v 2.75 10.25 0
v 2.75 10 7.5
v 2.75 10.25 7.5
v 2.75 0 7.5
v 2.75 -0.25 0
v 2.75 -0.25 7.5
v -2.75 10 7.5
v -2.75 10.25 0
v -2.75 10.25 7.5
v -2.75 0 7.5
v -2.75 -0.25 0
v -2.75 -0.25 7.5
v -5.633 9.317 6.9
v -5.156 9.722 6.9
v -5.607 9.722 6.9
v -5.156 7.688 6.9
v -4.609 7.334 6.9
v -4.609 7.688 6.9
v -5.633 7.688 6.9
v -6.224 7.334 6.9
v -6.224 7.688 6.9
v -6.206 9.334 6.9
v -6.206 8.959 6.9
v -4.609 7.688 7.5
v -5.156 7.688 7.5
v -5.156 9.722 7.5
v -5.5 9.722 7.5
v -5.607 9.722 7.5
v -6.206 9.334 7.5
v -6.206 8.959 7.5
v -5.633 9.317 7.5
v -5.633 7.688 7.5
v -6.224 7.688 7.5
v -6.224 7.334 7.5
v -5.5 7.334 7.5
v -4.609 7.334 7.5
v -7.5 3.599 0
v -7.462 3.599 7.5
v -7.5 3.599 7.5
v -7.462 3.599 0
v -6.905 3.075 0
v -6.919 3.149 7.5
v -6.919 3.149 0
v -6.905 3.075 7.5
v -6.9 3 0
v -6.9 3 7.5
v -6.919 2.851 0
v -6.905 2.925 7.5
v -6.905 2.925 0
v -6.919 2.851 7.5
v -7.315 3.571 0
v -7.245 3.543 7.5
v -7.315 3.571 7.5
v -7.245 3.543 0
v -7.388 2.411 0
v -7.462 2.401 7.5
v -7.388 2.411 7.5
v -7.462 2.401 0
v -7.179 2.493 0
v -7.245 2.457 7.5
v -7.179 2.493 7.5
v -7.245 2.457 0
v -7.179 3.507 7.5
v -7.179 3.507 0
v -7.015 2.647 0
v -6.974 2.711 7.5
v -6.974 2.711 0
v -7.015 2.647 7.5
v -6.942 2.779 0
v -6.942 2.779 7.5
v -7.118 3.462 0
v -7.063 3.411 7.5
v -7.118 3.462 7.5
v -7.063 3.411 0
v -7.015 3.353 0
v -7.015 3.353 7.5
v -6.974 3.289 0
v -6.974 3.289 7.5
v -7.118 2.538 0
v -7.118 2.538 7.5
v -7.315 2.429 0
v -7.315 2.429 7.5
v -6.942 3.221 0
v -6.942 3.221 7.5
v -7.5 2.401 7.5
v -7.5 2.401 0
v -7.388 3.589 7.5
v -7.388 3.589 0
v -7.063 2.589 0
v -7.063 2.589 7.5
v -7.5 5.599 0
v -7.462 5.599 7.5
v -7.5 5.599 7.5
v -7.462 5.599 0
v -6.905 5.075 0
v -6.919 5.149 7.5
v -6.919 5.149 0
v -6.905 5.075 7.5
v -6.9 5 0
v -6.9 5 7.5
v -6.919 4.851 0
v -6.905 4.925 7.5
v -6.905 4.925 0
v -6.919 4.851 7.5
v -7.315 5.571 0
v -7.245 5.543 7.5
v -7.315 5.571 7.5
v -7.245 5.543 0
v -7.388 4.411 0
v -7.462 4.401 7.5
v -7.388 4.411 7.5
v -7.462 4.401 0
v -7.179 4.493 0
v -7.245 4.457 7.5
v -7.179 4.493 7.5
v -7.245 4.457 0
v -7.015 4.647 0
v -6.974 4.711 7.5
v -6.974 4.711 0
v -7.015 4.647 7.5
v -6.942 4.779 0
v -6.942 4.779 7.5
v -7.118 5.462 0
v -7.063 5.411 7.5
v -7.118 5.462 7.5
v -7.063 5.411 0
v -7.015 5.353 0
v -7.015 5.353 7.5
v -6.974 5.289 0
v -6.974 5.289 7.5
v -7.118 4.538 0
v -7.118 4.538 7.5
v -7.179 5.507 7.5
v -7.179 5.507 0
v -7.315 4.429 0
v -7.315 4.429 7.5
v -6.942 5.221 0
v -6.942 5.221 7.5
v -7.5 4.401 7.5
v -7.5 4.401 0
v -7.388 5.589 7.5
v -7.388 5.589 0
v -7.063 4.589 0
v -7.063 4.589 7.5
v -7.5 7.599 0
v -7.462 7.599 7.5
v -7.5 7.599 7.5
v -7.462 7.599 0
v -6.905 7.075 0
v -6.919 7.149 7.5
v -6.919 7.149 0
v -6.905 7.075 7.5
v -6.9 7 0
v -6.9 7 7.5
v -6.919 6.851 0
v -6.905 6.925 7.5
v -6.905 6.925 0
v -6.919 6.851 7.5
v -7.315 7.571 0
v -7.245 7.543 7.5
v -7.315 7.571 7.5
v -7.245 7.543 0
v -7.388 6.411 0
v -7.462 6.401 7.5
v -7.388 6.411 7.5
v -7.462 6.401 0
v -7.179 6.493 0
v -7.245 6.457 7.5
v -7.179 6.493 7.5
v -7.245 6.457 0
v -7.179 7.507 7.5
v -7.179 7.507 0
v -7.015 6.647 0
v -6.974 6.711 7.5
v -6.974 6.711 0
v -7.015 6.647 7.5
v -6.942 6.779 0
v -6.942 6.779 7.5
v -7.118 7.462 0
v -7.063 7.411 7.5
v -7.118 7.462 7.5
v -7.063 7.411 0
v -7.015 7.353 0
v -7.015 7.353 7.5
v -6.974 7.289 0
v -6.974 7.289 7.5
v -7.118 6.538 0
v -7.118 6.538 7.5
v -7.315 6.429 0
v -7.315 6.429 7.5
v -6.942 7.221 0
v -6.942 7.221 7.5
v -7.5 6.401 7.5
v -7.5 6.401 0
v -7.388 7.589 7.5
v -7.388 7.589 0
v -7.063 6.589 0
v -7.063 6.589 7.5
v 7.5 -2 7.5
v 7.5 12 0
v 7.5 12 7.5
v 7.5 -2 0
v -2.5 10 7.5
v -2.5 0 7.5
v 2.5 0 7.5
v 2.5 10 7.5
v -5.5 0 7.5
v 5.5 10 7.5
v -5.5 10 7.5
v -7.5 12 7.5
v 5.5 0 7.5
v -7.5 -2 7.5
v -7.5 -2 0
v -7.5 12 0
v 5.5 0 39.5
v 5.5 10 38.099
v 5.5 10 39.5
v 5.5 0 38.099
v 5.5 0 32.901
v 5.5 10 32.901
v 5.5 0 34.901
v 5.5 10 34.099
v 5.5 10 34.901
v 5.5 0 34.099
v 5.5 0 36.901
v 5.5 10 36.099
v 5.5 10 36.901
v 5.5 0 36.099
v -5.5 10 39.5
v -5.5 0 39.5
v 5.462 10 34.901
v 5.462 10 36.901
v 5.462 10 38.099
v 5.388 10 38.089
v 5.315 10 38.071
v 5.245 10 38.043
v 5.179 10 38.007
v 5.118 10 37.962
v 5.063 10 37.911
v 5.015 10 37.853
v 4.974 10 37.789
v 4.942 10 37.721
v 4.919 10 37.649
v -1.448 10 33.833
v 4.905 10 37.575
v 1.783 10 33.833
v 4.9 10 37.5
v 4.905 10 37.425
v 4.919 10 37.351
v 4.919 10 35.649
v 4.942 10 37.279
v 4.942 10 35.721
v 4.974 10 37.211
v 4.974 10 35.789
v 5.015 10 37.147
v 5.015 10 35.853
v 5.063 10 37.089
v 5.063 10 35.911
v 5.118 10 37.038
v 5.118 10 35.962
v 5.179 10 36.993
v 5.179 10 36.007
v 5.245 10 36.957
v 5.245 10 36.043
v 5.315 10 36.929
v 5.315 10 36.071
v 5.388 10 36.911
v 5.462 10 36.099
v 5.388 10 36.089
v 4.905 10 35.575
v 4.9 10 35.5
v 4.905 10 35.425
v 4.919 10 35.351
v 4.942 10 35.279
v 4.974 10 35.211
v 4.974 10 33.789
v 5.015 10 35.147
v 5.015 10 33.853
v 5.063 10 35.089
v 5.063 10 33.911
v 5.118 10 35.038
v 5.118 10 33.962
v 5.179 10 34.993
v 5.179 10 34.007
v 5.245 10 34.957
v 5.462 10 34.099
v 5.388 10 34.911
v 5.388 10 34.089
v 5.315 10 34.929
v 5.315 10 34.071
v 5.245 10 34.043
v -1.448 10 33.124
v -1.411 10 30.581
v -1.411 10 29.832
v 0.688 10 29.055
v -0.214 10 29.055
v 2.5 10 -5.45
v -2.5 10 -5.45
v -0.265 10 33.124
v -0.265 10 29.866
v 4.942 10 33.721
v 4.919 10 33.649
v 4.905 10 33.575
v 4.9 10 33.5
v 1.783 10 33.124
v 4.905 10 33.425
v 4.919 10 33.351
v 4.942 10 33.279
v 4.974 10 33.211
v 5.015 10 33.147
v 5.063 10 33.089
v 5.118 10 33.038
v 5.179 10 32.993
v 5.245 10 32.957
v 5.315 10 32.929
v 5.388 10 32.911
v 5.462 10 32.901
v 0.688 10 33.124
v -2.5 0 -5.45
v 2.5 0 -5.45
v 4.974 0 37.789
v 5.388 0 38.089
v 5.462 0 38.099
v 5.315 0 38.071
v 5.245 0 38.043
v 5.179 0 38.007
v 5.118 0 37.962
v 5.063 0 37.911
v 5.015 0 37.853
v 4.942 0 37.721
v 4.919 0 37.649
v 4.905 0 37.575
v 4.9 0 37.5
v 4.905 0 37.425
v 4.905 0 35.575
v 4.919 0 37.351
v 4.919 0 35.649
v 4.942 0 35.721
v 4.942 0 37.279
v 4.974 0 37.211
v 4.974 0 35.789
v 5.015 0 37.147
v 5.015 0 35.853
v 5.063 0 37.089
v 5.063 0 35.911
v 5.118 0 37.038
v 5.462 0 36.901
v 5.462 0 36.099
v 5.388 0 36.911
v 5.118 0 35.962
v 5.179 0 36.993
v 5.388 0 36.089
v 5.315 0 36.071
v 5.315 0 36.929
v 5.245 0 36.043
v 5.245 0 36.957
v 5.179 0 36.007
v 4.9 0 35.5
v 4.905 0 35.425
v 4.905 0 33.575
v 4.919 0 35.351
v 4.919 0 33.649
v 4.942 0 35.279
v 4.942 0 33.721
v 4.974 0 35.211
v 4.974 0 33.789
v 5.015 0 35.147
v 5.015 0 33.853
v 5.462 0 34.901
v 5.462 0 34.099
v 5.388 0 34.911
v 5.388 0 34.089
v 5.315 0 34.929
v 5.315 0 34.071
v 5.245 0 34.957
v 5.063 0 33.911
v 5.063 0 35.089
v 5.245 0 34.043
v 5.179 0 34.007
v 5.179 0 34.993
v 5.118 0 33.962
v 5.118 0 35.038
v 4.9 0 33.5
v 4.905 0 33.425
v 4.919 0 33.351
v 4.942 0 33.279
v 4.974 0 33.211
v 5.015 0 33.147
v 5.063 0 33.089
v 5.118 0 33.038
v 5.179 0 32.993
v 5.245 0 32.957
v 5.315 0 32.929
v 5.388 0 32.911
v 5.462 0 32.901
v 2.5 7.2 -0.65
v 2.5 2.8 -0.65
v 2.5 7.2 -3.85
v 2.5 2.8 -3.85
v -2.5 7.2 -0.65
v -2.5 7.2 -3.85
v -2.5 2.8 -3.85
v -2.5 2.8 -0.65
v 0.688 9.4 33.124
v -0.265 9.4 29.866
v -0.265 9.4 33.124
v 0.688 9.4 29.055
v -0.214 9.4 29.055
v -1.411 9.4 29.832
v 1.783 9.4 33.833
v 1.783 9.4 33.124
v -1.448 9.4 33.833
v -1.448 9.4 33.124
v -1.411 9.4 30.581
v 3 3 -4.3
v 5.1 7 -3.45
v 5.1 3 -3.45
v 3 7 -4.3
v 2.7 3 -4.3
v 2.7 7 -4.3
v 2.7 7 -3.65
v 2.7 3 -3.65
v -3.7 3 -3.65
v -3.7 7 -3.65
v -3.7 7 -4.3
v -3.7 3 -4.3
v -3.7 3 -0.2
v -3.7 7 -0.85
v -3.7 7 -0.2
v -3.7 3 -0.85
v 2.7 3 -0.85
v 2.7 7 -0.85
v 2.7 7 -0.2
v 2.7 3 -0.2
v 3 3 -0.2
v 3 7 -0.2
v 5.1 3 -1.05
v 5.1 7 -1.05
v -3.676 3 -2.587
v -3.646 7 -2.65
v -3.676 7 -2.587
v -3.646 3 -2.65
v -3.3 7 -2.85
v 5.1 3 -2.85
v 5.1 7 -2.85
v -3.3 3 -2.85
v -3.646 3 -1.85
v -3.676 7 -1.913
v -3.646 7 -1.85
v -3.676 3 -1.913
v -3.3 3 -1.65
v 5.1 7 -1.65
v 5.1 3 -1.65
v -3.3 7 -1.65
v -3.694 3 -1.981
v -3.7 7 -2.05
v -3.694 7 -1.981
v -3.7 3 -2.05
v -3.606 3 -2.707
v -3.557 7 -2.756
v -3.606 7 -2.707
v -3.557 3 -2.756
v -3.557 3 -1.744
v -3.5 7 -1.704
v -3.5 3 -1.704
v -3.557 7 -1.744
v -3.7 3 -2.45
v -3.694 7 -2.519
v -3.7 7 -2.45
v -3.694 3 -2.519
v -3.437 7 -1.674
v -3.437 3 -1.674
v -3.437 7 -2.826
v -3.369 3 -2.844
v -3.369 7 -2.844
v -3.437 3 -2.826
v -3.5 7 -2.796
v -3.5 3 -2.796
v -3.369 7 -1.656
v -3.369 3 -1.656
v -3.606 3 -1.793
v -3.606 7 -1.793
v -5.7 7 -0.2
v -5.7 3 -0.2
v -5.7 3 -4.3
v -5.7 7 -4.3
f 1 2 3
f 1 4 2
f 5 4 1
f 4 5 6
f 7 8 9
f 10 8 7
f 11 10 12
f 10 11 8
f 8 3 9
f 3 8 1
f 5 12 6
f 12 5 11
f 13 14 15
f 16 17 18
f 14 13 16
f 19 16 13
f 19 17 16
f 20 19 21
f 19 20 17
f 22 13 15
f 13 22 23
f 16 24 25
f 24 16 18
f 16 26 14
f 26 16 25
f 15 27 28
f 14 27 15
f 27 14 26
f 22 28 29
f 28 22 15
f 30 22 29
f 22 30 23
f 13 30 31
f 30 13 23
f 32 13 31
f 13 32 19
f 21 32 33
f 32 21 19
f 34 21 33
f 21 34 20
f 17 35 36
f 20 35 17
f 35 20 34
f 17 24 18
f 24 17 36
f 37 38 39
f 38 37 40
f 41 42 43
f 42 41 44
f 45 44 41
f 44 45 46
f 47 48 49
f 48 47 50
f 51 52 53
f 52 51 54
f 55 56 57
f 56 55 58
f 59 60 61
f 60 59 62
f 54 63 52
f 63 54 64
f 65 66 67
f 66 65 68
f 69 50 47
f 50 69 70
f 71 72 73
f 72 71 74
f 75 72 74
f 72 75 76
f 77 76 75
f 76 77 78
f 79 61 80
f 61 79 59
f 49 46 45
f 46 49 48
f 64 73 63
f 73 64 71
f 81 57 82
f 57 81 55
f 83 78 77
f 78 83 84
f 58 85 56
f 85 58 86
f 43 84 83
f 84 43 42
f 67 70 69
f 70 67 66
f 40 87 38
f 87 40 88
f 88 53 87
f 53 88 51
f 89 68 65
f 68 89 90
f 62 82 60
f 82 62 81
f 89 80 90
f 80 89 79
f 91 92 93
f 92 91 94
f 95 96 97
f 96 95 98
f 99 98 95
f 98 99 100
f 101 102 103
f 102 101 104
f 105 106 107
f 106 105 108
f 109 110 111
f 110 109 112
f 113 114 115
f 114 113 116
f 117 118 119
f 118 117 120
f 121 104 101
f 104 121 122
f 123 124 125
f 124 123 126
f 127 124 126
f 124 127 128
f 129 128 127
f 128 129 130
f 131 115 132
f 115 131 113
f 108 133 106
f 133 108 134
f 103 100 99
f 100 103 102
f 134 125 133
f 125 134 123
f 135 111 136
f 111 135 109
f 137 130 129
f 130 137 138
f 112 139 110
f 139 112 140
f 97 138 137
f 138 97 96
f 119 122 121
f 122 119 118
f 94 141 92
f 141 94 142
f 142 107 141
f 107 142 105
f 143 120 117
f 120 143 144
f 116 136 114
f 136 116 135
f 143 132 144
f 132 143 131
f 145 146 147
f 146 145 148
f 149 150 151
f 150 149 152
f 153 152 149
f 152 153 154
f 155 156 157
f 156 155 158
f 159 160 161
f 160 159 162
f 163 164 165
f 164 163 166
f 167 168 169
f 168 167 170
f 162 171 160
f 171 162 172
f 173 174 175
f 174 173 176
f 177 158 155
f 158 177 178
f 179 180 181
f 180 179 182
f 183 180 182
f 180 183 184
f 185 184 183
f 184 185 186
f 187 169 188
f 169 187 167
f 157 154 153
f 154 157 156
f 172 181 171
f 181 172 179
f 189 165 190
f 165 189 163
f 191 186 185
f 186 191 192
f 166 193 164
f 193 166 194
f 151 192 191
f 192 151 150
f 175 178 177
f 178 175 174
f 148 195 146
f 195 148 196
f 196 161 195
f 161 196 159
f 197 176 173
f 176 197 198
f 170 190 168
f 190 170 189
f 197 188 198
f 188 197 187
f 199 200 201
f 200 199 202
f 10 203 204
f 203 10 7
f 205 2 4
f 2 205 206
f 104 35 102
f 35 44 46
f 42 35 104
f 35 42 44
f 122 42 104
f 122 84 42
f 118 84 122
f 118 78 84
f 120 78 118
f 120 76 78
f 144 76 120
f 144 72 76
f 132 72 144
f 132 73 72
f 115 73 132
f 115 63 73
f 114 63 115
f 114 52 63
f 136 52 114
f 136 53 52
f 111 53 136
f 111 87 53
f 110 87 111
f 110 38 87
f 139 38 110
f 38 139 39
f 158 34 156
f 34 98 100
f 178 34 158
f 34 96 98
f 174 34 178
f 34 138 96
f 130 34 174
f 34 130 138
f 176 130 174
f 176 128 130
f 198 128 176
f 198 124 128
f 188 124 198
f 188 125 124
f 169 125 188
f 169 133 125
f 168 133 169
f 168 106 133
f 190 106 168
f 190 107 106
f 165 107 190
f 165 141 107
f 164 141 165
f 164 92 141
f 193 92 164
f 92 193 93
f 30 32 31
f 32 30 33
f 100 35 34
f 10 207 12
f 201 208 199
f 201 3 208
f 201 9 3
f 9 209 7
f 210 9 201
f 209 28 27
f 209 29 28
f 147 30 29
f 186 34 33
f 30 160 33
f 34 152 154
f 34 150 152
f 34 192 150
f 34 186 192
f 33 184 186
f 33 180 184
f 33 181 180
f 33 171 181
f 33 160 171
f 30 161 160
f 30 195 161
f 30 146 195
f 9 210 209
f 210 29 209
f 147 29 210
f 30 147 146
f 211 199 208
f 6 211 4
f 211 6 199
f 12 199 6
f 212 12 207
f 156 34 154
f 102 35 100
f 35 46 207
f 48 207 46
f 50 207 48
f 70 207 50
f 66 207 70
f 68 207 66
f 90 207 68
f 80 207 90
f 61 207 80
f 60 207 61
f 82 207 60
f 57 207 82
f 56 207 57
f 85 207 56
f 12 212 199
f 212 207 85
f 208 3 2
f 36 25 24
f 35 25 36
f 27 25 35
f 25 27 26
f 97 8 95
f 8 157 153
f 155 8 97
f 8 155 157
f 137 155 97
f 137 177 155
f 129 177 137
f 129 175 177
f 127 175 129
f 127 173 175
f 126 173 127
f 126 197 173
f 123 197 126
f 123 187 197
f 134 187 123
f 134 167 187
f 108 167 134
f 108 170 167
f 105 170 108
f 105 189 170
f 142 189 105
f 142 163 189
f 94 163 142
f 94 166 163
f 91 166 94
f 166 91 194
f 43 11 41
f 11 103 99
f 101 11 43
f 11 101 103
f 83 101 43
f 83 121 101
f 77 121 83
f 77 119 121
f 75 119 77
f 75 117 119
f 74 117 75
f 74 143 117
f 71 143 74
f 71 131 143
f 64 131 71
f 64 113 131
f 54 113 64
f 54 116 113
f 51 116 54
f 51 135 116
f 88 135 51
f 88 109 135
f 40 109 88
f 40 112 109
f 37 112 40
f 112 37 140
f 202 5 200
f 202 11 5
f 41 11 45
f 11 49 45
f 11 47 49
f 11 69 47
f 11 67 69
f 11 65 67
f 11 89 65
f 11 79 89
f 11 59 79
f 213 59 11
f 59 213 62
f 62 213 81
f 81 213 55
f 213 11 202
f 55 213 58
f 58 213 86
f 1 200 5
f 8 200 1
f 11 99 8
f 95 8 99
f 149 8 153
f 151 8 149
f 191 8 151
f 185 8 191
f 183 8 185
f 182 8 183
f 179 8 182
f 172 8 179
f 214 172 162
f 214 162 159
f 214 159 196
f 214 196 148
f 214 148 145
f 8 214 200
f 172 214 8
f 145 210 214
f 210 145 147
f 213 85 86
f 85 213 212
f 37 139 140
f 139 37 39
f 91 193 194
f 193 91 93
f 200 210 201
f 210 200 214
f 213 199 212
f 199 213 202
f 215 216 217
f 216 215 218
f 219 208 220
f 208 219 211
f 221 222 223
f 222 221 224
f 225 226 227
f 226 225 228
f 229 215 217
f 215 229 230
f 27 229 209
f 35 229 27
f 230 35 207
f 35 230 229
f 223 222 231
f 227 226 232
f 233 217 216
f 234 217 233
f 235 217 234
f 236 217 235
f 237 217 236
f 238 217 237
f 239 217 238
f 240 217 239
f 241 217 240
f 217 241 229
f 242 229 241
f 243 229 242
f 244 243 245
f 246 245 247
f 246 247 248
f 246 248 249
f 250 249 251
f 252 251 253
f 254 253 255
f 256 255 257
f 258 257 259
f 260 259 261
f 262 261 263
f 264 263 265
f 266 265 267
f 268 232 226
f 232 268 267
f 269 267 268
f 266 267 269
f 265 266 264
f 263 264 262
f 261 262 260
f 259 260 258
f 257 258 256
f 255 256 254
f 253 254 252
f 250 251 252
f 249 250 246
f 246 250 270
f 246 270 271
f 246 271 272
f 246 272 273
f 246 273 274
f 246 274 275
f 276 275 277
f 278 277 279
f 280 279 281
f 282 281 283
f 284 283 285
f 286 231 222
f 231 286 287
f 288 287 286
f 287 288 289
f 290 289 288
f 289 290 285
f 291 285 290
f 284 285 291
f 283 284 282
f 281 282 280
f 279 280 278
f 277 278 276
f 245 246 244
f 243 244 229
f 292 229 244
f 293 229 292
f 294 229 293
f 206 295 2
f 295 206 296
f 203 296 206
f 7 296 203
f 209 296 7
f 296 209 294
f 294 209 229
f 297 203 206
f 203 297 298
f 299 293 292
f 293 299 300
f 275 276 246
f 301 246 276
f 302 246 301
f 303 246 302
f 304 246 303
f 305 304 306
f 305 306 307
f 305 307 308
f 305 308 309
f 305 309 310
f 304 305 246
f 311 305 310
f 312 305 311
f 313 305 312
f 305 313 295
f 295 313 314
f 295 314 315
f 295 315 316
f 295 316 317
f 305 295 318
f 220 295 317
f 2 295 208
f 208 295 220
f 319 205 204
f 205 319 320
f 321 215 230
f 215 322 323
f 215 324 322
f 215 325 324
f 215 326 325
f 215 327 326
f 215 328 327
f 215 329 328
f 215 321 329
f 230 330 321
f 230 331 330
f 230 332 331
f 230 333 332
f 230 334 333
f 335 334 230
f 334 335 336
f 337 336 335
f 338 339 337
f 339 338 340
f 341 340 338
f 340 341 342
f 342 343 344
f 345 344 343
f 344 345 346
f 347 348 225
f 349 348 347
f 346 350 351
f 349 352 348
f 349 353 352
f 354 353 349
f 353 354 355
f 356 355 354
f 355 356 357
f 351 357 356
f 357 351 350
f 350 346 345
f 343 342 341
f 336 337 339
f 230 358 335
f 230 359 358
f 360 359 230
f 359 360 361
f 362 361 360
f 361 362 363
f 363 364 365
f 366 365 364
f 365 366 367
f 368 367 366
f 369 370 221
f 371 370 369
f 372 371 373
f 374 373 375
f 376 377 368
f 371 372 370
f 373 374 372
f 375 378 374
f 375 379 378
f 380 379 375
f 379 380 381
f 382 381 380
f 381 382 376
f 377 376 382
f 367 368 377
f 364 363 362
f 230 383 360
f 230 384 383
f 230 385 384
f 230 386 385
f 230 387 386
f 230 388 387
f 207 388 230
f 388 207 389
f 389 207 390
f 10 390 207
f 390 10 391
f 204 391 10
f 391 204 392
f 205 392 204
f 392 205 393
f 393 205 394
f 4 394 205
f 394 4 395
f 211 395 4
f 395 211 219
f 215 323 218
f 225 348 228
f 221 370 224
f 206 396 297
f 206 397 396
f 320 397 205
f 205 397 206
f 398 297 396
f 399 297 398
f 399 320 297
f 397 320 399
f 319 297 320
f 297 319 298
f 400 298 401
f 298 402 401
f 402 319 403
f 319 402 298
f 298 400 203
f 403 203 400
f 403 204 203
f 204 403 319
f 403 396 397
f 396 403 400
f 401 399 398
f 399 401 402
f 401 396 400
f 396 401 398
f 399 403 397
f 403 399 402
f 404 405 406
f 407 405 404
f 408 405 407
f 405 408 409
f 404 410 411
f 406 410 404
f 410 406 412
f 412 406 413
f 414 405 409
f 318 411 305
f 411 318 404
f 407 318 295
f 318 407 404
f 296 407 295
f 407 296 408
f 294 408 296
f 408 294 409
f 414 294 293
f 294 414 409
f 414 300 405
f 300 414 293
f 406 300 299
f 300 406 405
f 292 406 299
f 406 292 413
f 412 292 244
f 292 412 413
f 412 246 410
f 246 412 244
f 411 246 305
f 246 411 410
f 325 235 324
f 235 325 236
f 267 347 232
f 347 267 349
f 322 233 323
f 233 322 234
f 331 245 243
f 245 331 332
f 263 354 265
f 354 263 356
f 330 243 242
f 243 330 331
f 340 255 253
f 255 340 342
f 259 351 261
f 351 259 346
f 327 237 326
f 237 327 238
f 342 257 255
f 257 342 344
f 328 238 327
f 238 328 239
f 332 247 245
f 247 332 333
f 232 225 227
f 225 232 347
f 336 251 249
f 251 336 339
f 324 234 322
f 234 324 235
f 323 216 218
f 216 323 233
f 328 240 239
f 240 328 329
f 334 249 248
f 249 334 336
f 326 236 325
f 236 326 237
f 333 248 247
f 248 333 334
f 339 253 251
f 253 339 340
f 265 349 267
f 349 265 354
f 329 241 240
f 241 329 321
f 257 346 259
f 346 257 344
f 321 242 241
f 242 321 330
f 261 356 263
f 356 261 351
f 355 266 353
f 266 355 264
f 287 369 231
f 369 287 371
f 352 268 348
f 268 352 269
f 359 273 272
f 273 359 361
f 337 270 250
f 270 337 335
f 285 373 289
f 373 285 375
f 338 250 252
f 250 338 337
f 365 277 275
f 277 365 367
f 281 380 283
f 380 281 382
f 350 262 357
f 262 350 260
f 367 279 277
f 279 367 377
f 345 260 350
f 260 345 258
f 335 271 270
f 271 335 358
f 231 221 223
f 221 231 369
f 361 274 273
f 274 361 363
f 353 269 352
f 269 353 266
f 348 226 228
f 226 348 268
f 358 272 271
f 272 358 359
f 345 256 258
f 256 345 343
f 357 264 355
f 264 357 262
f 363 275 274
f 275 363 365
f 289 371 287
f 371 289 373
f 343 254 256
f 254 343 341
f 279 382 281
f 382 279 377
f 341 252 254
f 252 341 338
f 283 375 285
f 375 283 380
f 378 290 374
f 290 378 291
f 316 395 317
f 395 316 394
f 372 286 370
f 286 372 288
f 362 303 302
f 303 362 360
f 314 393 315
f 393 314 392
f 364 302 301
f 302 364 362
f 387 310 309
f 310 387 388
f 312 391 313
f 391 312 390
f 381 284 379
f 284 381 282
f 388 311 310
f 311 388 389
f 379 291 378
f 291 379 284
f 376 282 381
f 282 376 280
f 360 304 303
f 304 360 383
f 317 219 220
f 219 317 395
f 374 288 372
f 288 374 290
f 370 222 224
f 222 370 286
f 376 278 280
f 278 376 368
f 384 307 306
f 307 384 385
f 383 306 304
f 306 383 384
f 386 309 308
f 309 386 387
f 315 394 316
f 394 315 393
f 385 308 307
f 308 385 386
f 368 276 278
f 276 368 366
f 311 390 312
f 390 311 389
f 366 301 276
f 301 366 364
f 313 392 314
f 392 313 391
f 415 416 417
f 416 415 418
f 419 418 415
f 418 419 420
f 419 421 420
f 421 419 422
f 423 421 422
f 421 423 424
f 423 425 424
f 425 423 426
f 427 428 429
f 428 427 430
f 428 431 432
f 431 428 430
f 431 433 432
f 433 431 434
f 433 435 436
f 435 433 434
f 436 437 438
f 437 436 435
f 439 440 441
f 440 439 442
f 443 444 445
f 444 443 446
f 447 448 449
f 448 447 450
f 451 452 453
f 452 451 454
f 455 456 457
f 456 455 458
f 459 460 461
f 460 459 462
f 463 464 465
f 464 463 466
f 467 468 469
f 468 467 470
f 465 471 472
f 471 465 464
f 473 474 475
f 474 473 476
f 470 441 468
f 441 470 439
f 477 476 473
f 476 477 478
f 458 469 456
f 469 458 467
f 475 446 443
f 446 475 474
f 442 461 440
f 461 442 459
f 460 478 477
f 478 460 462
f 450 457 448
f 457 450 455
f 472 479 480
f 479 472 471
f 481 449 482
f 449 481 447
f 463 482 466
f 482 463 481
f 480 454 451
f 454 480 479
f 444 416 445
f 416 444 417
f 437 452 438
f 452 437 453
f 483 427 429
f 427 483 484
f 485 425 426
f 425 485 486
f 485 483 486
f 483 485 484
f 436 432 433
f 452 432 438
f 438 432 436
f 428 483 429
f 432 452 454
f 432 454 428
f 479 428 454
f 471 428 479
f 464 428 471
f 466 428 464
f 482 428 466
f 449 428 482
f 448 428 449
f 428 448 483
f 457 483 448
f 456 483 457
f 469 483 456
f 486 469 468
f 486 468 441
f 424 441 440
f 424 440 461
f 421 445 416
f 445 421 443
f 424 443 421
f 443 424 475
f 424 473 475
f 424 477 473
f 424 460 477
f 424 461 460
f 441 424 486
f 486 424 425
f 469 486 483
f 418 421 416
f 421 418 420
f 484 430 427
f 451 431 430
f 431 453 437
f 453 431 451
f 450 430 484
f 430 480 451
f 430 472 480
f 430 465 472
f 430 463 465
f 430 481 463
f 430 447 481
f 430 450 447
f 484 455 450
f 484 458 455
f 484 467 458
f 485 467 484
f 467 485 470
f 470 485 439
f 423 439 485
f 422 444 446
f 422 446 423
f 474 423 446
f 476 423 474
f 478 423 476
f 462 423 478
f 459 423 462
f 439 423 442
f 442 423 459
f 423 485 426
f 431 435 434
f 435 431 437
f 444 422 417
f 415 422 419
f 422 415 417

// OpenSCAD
$fn = 50;

difference() {
	union() {
		translate(v = [0, 0, 0]) {
			rotate(a = [0, 0, 0]) {
				difference() {
					union() {
						translate(v = [-7.5, -2.0, 0]) {
							cube(size = [15.0, 14.0, 7.5]);
						}
					}
					union() {
						translate(v = [-2.75, -0.25, -0.1]) {
							cube(size = [5.5, 10.5, 7.7]);
						}
						translate(v = [-5.5, 8.5, 6.9]) {
							linear_extrude(height = 0.7) {
								text(font = "Arial:style=Bold", halign = "center", size = 2.5, text = "1", valign = "center");
							}
						}
						translate(v = [-7.5, 3, -0.1]) {
							cylinder(h = 7.7, r = 0.6);
						}
						translate(v = [-7.5, 5, -0.1]) {
							cylinder(h = 7.7, r = 0.6);
						}
						translate(v = [-7.5, 7, -0.1]) {
							cylinder(h = 7.7, r = 0.6);
						}
					}
				}
			}
		}
		translate(v = [0, 0, 7.5]) {
			rotate(a = [0, 0, 0]) {
				difference() {
					union() {
						translate(v = [-5.5, 0, 0]) {
							cube(size = [11.0, 10.0, 32.0]);
						}
						translate(v = [-2.5, 0, -12.95]) {
							cube(size = [5.0, 10.0, 13.049999999999999]);
						}
					}
					union() {
						translate(v = [-2.6, 2.8, -11.35]) {
							cube(size = [5.2, 4.4, 3.1999999999999997]);
						}
						translate(v = [0, 9.4, 24.0]) {
							rotate(a = [-90, 0, 0]) {
								linear_extrude(height = 0.7) {
									text(font = "Arial:style=Bold", halign = "center", size = 5.0, text = "1", valign = "center");
								}
							}
						}
						translate(v = [5.5, 10.1, 30.0]) {
							rotate(a = [90, 0, 0]) {
								cylinder(h = 10.2, r = 0.6);
							}
						}
						translate(v = [5.5, 10.1, 28.0]) {
							rotate(a = [90, 0, 0]) {
								cylinder(h = 10.2, r = 0.6);
							}
						}
						translate(v = [5.5, 10.1, 26.0]) {
							rotate(a = [90, 0, 0]) {
								cylinder(h = 10.2, r = 0.6);
							}
						}
					}
				}
			}
		}
		translate(v = [0, 3.0, -2.25]) {
			rotate(a = [0, 0, 0]) {
				difference() {
					union() {
						translate(v = [-5.7, 0, -2.05]) {
							cube(size = [10.8, 4.0, 4.1]);
						}
					}
					union() {
						translate(v = [0, 4.1, 0]) {
							rotate(a = [90, 0, 0]) {
								linear_extrude(height = 4.2) {
									polygon(points = [[-3.7, -1.4], [2.7, -1.4], [2.7, -2.05], [3.0, -2.05], [5.1, -1.2], [5.2, -1.2], [5.2, -2.15], [-3.7, -2.15]]);
								}
							}
						}
						translate(v = [0, 4.1, 0]) {
							rotate(a = [90, 0, 0]) {
								linear_extrude(height = 4.2) {
									polygon(points = [[-3.7, 1.4], [2.7, 1.4], [2.7, 2.05], [3.0, 2.05], [5.1, 1.2], [5.2, 1.2], [5.2, 2.15], [-3.7, 2.15]]);
								}
							}
						}
						translate(v = [0, 4.1, 0]) {
							rotate(a = [90, 0, 0]) {
								linear_extrude(height = 4.2) {
									polygon(points = [[-3.7, 0.2], [-3.693923, 0.269459], [-3.675877, 0.336808], [-3.64641, 0.4], [-3.606418, 0.457115], [-3.557115, 0.506418], [-3.5, 0.54641], [-3.436808, 0.575877], [-3.369459, 0.593923], [-3.3, 0.6], [5.2, 0.6], [5.2, -0.6], [-3.3, -0.6], [-3.369459, -0.593923], [-3.436808, -0.575877], [-3.5, -0.54641], [-3.557115, -0.506418], [-3.606418, -0.457115], [-3.64641, -0.4], [-3.675877, -0.336808], [-3.693923, -0.269459], [-3.7, -0.2]]);
								}
							}
						}
					}
				}
			}
		}
	}
	union();
}
